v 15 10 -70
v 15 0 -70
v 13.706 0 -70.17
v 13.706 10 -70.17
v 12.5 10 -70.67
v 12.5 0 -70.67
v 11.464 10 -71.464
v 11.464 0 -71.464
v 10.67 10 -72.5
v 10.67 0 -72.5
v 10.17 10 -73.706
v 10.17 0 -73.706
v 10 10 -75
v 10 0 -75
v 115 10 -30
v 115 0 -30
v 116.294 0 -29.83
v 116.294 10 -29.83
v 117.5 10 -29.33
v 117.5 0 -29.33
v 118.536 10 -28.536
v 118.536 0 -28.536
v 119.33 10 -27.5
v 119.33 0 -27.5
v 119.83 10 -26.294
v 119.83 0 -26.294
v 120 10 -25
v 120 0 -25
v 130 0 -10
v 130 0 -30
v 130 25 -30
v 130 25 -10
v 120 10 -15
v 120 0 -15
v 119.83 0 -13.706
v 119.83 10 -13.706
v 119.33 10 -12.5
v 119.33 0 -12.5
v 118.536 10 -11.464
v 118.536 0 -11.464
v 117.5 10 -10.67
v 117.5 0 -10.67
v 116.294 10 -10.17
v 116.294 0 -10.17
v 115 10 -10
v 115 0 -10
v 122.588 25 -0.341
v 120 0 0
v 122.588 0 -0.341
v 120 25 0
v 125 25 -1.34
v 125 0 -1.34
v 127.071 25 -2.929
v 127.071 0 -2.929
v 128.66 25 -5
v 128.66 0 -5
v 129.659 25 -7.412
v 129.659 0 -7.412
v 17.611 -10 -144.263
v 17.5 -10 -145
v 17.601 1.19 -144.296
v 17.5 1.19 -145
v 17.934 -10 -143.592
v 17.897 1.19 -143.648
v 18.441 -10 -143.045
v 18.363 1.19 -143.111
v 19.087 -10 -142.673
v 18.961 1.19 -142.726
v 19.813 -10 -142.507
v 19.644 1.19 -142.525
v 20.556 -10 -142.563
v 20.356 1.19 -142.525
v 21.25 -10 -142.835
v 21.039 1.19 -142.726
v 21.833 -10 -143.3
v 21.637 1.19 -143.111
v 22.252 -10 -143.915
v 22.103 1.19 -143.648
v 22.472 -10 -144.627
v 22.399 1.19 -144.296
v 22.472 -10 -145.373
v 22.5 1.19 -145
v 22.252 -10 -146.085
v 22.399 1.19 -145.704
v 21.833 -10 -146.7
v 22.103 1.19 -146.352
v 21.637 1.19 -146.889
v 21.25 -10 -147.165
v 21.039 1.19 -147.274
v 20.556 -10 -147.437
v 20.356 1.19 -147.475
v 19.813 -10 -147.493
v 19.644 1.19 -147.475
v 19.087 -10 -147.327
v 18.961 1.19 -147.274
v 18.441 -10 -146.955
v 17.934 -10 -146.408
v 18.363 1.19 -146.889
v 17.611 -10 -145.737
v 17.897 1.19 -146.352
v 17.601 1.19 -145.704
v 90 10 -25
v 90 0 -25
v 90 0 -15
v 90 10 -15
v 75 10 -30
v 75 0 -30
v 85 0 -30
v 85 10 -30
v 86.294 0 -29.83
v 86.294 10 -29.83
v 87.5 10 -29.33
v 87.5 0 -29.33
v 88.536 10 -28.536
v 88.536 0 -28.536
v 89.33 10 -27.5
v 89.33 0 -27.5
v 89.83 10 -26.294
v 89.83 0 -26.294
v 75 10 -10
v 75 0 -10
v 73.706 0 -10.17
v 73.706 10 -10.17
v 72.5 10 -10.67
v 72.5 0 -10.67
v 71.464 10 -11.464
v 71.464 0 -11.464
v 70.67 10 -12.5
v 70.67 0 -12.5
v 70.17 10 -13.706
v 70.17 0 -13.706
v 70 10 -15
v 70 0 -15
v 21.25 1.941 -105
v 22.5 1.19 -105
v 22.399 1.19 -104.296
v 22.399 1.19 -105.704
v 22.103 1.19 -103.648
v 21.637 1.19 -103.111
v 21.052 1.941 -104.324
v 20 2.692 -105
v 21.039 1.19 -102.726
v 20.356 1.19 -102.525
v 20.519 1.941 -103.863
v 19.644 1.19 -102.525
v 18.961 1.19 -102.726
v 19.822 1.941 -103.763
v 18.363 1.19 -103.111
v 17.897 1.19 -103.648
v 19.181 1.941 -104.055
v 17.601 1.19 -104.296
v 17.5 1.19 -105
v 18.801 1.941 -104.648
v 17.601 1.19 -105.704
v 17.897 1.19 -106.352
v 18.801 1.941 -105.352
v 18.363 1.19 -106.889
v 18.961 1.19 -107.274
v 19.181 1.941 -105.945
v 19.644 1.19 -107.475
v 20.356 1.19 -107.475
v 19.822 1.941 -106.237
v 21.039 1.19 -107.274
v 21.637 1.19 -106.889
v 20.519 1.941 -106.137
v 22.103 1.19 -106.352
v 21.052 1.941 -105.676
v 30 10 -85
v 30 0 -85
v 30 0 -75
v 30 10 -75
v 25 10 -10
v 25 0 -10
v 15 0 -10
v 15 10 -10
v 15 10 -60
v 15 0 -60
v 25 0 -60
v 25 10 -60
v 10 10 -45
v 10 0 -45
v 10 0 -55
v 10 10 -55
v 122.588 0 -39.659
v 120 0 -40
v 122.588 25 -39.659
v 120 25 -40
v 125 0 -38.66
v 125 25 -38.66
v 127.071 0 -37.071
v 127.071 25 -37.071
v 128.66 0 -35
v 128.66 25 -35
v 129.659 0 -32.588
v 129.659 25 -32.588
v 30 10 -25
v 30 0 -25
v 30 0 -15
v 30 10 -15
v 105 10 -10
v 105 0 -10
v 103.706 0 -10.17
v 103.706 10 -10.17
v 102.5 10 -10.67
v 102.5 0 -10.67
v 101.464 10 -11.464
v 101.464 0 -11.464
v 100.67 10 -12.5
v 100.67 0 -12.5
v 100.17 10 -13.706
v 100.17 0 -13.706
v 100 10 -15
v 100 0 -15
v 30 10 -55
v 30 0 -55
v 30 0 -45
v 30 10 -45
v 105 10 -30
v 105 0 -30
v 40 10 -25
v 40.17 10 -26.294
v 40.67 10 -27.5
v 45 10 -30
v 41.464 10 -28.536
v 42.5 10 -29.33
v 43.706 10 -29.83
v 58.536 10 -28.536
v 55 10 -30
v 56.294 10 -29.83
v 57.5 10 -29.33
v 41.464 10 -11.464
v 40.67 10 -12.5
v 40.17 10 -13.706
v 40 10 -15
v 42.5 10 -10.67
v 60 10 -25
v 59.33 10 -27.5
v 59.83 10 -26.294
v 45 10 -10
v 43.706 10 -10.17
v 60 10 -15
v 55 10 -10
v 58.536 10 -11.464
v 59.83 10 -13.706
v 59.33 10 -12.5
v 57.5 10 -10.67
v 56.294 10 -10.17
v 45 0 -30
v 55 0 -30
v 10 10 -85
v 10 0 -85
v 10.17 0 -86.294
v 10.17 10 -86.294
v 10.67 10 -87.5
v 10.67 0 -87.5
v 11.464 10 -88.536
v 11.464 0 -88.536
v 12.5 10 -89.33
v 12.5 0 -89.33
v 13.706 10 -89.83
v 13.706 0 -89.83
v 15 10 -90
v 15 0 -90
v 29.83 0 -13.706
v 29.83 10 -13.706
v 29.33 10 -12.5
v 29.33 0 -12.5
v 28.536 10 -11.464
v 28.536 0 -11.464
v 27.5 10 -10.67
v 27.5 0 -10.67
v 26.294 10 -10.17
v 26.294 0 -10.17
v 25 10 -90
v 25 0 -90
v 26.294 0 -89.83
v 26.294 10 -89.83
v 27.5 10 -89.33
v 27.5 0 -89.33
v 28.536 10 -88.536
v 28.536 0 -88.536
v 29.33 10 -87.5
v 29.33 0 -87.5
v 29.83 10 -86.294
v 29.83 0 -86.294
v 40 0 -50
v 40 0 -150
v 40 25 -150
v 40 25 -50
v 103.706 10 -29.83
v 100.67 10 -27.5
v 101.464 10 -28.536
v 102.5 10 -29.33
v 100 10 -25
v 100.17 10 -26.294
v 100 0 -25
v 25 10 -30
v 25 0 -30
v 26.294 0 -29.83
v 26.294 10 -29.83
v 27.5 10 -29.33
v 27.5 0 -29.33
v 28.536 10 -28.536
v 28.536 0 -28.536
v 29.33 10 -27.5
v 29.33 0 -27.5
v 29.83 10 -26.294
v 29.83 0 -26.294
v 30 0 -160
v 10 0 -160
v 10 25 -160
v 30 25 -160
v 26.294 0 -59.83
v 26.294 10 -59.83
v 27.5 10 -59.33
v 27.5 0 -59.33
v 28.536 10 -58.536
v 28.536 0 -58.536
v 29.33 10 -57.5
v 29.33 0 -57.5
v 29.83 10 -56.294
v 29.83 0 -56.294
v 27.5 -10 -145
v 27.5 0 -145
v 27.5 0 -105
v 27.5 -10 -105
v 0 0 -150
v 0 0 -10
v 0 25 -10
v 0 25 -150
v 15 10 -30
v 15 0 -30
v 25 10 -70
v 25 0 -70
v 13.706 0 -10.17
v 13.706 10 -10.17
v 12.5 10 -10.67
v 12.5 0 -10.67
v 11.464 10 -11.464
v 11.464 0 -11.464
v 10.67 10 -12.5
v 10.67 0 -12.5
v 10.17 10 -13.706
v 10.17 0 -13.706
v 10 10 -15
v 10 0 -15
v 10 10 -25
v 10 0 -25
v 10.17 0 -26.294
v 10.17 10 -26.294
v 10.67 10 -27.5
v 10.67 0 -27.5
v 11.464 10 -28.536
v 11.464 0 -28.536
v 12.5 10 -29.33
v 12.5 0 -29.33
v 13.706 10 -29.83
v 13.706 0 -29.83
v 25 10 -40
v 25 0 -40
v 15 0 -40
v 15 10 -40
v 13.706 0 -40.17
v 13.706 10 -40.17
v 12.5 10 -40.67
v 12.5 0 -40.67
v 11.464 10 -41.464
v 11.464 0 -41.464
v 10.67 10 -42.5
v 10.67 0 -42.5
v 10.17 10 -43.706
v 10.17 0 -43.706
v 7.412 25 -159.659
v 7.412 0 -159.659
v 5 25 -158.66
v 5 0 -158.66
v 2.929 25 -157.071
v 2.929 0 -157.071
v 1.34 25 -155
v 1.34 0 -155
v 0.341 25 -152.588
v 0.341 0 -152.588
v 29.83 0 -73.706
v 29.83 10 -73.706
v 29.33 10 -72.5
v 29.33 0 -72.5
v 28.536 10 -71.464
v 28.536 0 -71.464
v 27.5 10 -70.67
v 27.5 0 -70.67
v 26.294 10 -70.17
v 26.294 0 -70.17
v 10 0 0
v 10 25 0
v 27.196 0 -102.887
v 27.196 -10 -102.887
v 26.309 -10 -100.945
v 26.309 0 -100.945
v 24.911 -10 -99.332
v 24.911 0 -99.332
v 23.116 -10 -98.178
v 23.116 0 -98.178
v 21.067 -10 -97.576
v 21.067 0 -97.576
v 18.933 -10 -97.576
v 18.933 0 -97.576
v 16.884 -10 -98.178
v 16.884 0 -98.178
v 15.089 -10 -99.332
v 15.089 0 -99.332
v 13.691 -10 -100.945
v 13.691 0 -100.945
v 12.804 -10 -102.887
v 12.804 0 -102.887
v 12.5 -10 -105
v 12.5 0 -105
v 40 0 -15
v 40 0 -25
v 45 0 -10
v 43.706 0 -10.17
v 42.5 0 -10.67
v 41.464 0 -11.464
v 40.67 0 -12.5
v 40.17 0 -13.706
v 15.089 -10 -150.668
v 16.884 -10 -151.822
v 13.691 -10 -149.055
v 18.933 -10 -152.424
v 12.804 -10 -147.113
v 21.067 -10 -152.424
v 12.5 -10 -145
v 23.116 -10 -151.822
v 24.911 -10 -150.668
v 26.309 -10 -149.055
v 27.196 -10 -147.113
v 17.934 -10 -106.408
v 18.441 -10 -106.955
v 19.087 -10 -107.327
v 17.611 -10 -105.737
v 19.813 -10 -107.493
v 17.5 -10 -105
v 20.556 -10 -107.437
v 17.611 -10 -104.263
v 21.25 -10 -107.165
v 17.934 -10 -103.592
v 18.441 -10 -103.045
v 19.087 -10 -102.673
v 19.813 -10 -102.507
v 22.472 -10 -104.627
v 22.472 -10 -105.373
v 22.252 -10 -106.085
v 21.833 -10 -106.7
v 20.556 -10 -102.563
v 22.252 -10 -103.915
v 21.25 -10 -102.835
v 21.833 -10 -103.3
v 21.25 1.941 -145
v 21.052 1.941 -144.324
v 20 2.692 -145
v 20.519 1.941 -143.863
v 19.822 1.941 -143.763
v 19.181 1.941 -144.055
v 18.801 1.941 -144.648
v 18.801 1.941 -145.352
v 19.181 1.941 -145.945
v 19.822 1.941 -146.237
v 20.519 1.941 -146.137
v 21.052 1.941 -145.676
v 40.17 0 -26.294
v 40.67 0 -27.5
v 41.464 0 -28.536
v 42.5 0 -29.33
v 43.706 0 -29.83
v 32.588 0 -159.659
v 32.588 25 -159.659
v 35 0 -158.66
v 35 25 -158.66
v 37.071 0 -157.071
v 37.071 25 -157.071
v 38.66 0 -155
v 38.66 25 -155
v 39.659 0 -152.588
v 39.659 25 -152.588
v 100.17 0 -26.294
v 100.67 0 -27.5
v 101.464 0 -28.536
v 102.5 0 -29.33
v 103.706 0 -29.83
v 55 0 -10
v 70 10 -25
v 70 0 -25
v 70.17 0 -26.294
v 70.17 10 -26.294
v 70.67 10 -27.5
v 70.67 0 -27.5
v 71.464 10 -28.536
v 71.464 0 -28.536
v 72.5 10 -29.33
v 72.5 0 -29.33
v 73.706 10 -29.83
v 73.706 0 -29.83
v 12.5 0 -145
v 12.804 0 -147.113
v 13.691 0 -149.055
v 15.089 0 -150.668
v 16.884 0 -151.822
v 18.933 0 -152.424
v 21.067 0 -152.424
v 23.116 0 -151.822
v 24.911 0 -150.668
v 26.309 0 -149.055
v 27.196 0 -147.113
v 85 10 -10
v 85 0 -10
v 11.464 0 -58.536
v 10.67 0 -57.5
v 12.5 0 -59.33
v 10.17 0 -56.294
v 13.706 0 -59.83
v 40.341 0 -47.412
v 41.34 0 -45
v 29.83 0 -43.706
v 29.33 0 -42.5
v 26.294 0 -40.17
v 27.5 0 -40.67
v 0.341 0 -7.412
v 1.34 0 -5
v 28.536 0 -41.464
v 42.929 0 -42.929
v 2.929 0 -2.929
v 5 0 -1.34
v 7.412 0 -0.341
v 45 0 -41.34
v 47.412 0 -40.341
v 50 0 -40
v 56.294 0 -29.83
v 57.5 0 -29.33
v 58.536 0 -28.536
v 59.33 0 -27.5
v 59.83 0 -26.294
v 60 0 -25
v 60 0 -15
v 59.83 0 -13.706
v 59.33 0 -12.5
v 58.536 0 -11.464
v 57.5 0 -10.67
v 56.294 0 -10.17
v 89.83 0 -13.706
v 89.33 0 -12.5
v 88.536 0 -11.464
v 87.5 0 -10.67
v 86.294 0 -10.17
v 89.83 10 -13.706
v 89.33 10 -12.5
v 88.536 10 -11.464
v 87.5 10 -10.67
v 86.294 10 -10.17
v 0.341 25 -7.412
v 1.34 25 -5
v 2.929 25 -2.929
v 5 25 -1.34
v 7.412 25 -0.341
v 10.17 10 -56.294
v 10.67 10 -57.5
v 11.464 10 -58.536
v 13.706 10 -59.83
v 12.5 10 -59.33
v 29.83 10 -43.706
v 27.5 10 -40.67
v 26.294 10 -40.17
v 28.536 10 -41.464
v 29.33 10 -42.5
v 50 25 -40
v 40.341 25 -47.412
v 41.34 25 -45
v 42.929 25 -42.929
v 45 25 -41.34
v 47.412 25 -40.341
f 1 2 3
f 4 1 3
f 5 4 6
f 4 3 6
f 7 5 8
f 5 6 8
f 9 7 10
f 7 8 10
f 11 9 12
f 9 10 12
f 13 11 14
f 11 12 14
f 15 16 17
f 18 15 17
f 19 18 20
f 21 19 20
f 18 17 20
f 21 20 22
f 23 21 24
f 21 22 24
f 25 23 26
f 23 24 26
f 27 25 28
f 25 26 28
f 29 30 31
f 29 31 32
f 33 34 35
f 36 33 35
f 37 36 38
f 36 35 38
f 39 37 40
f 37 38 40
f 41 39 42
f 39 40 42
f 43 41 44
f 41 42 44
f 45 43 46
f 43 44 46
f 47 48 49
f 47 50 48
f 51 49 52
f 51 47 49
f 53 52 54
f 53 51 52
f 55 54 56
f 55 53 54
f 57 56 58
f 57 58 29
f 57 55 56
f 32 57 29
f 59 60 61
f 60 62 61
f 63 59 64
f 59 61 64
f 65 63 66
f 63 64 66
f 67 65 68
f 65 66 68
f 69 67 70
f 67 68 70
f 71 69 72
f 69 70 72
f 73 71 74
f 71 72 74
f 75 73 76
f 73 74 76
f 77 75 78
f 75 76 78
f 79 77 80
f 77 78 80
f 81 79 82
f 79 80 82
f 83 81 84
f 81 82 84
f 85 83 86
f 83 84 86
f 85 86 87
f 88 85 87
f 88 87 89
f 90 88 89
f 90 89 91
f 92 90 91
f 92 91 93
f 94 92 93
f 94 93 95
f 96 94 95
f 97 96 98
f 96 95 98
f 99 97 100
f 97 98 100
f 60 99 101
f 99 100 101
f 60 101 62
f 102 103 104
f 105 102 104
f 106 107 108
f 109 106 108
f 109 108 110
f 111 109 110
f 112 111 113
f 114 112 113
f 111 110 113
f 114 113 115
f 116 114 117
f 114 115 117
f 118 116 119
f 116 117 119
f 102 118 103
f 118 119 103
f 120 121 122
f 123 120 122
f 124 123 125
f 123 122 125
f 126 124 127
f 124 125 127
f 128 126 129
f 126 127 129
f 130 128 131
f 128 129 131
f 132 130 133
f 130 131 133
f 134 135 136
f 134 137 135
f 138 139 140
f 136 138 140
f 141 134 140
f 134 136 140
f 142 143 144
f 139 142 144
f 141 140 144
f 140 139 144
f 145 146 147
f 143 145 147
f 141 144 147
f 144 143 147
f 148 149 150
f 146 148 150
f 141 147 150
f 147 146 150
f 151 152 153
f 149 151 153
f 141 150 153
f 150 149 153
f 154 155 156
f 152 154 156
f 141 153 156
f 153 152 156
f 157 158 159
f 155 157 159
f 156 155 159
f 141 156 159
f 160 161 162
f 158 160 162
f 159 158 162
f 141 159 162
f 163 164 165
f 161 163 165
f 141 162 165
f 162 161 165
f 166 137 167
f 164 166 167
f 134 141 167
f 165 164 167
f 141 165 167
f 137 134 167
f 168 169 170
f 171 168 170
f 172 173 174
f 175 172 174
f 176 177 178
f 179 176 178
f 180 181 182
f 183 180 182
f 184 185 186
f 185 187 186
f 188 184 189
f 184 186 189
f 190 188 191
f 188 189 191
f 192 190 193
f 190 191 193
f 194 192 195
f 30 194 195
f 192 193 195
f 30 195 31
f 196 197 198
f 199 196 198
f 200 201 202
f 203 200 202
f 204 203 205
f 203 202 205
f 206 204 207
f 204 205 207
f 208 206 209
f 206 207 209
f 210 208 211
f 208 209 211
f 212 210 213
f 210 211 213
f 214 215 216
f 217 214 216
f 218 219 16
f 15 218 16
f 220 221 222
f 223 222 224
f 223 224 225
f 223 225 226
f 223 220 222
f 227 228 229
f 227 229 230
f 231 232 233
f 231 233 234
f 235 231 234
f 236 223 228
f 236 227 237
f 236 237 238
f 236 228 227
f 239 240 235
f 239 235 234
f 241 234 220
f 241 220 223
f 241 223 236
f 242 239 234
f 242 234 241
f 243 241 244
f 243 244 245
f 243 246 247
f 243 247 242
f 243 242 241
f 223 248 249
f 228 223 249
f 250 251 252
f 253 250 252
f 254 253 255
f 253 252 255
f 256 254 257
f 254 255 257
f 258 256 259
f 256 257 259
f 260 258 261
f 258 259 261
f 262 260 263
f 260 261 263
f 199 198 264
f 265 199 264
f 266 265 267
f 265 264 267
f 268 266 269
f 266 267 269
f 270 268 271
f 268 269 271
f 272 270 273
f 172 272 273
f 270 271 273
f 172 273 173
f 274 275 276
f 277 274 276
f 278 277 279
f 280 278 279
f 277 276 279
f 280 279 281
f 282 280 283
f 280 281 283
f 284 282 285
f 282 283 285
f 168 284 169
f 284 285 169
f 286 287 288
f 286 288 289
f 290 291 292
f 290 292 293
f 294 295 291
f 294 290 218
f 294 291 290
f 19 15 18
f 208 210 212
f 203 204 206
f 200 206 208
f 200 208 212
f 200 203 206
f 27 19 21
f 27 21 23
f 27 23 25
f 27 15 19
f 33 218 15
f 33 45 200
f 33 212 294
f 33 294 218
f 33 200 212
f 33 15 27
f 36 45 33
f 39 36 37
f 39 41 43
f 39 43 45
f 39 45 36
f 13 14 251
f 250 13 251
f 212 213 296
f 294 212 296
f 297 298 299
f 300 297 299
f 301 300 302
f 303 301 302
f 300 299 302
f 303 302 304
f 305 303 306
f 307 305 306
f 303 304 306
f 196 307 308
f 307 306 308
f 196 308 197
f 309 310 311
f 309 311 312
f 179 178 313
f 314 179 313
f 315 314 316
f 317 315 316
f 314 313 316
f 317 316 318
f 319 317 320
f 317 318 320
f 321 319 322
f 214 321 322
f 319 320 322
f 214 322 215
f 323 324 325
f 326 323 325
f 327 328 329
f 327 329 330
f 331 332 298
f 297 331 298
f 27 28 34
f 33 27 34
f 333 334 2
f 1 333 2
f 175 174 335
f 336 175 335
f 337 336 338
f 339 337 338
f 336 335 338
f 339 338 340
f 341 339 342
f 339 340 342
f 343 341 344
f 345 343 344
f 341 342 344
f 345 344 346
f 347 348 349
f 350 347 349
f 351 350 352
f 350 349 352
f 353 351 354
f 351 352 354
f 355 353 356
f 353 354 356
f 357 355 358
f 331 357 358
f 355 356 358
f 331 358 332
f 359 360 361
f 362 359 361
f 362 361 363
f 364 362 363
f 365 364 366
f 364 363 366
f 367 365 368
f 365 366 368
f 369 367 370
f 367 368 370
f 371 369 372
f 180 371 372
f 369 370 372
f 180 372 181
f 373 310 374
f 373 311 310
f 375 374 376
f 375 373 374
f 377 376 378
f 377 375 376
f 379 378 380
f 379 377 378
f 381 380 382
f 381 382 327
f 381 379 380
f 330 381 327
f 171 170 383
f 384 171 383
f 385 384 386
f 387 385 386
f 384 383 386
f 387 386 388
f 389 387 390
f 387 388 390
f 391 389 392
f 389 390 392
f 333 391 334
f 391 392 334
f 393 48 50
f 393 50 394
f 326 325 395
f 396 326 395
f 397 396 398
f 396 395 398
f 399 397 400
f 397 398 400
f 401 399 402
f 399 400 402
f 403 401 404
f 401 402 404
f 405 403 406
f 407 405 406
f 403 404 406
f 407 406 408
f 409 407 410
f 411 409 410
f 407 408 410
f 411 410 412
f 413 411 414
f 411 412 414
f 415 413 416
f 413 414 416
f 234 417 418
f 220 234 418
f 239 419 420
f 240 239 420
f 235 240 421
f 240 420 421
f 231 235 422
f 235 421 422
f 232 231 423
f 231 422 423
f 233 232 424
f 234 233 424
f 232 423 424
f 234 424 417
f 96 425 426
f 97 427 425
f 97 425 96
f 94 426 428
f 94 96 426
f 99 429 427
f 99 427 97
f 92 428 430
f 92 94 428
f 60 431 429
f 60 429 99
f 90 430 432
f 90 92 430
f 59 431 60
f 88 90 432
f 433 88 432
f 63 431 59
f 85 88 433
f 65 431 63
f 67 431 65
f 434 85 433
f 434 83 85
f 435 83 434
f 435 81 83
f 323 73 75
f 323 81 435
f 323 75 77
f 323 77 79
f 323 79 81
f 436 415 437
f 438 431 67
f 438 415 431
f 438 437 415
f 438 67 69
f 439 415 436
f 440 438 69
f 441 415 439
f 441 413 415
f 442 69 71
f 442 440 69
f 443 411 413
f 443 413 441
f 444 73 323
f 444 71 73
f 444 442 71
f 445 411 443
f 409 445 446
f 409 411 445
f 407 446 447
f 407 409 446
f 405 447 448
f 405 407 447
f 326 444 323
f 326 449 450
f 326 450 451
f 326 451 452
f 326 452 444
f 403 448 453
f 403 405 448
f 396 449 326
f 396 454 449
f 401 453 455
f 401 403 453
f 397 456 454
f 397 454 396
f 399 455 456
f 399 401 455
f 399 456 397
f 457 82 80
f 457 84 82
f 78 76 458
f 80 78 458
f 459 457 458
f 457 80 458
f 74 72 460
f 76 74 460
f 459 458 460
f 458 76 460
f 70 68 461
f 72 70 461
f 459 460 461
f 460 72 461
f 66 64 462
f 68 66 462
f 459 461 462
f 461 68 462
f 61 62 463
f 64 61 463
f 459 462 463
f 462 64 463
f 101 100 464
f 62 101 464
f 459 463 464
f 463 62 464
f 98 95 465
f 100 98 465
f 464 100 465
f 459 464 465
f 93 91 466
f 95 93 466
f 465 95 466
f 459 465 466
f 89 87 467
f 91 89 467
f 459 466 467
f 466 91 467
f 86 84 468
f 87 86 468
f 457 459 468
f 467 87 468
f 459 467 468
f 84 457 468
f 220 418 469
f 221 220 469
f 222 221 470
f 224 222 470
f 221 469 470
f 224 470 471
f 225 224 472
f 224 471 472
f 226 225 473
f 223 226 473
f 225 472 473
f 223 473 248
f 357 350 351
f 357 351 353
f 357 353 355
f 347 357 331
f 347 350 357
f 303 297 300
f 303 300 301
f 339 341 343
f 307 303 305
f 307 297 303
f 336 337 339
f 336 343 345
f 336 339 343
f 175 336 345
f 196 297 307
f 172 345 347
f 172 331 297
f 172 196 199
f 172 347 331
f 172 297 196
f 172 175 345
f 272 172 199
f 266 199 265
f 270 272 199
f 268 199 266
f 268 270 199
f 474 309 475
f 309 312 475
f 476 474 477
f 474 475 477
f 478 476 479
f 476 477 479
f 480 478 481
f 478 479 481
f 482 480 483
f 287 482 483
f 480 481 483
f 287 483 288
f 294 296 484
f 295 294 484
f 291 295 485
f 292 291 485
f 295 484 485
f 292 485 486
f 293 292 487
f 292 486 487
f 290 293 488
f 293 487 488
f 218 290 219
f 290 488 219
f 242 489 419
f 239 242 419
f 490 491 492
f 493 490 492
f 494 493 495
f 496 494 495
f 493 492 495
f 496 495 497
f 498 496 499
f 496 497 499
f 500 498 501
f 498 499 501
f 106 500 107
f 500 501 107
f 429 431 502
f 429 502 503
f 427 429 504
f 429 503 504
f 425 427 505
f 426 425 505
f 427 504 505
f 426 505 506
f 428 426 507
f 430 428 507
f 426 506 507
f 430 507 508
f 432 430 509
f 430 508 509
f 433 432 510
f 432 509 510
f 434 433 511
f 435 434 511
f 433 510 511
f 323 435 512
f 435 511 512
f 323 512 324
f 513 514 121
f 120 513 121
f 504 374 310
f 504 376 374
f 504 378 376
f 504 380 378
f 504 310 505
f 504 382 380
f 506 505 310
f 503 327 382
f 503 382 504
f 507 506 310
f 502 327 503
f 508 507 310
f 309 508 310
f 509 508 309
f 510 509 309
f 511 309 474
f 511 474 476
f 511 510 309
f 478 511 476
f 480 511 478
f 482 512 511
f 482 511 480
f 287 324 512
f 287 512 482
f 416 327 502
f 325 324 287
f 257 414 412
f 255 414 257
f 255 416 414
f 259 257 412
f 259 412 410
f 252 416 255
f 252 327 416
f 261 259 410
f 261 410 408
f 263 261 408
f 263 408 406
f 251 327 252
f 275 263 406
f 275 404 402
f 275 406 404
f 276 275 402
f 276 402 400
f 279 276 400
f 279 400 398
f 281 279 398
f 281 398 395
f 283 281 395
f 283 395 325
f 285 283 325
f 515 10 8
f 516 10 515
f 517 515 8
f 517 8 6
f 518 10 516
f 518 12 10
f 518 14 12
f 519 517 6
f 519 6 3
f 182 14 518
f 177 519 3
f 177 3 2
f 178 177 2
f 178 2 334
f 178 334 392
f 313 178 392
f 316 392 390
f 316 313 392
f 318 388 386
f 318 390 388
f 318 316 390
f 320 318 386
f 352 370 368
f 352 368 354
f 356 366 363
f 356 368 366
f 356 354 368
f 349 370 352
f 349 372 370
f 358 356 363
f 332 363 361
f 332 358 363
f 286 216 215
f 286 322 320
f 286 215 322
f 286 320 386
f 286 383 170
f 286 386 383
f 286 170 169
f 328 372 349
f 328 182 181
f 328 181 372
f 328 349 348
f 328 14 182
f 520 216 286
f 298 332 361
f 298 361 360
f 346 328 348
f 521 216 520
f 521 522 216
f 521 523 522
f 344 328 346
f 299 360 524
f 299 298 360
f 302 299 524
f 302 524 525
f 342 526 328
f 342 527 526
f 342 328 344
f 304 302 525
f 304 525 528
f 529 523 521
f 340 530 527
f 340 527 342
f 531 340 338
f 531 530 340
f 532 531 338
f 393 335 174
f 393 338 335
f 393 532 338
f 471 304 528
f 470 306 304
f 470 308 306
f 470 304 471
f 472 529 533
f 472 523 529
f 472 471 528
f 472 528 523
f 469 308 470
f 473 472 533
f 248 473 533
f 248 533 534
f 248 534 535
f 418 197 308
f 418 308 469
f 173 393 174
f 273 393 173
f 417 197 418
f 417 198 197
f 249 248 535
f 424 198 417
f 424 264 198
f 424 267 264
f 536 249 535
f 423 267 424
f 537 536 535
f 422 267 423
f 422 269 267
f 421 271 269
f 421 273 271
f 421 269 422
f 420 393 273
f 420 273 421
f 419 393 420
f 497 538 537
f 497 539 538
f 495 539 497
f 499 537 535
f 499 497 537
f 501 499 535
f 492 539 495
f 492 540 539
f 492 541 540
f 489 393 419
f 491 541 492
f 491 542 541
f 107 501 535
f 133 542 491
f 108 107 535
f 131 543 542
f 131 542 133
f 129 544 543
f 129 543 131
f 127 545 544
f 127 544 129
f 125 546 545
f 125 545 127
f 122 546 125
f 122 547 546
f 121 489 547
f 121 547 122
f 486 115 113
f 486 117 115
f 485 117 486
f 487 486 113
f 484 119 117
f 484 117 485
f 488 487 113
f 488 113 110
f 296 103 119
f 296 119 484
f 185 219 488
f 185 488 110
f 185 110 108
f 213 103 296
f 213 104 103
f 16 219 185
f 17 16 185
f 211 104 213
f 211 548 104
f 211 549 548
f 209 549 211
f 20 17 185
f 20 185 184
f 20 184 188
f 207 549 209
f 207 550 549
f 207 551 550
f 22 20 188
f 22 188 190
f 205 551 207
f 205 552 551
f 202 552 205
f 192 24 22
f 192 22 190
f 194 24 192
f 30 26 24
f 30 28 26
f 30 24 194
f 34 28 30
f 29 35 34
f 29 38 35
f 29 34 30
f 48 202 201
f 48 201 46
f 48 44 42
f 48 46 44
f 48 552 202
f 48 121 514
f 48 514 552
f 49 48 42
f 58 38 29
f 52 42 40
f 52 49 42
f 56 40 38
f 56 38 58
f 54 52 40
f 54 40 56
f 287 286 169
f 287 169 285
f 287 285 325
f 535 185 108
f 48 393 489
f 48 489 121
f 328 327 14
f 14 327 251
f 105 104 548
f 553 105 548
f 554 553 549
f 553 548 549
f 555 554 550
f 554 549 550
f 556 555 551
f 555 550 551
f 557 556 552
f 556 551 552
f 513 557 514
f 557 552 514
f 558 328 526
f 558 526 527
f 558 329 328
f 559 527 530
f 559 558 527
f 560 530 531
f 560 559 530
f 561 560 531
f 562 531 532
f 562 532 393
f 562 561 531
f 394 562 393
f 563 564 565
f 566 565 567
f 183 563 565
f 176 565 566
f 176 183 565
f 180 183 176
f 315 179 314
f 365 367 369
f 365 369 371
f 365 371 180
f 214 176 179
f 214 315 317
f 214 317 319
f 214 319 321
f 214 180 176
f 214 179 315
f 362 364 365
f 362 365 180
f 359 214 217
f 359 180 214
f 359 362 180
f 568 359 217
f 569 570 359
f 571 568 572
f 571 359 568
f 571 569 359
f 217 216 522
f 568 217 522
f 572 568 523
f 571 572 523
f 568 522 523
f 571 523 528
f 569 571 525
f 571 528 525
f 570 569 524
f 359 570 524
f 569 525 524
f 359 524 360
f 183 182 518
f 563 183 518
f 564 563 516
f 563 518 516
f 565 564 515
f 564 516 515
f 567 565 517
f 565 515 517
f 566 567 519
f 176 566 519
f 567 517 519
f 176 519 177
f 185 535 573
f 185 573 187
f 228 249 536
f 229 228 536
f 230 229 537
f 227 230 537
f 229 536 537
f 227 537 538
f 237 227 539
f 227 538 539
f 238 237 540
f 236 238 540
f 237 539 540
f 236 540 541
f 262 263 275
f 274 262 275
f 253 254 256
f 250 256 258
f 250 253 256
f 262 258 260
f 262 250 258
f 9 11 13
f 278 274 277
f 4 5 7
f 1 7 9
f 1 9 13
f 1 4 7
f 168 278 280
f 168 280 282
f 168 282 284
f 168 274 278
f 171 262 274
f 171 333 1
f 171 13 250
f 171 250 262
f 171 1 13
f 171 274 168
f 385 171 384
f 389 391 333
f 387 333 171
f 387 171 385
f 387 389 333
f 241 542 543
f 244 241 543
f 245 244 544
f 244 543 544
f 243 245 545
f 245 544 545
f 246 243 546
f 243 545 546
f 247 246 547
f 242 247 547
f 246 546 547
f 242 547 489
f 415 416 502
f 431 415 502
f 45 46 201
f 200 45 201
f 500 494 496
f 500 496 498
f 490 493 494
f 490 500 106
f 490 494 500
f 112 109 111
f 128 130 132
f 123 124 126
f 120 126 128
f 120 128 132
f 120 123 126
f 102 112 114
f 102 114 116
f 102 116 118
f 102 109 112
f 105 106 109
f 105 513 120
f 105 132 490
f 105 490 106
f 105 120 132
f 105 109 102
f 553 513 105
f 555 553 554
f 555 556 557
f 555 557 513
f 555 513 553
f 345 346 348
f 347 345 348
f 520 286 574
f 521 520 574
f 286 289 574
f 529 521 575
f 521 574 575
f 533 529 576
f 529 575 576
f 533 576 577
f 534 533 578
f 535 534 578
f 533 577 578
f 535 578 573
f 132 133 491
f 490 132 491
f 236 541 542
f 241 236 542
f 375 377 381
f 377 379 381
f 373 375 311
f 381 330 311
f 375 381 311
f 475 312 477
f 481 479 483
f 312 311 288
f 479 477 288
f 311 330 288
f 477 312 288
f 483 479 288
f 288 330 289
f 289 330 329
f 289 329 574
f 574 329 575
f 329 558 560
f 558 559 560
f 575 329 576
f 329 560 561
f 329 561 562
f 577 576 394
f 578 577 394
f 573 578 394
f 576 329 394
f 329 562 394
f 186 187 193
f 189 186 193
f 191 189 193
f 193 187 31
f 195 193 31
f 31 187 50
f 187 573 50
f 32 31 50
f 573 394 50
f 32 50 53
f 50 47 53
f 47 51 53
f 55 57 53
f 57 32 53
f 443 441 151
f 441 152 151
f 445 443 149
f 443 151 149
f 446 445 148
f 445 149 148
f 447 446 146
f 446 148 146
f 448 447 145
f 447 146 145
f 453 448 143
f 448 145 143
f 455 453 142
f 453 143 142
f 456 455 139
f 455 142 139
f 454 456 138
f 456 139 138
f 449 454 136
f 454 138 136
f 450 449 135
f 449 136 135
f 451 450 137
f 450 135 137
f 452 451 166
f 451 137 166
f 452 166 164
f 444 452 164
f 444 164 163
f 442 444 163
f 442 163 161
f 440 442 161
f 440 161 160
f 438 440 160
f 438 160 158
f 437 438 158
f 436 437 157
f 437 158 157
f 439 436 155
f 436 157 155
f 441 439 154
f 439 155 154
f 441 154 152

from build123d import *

# Parameters (mm, degrees)
F0_W     = 10
F0_H     = 10
F1_DEPTH = 25
F2_DEPTH = 10
F3_R     = 10
F5_DEPTH = 10
F7_D     = 5
F7_DEPTH = 11.19
F7_TIP   = 1.5021515476


with BuildPart() as f1:
    # F0 (on Front) → F1 (new body)
    with BuildSketch(Plane.XZ):
        with BuildLine():
            Line((15, -40), (0, -40))
            Line((0, -40), (0, -160))
            Line((0, -160), (40, -160))
            Line((40, -160), (40, -85))
            Line((40, -85), (40, -75))
            Line((40, -75), (40, -55))
            Line((40, -55), (40, -45))
            Line((40, -45), (40, -40))
            Line((40, -40), (25, -40))
            ThreePointArc((25, -40), (28.5355339059, -41.4644660941), (30, -45))
            Line((30, -45), (30, -55))
            ThreePointArc((30, -55), (28.5355339059, -58.5355339059), (25, -60))
            Line((25, -60), (15, -60))
            ThreePointArc((15, -60), (11.4644660941, -58.5355339059), (10, -55))
            Line((10, -55), (10, -45))
            ThreePointArc((10, -45), (11.4644660941, -41.4644660941), (15, -40))
        make_face()
        with BuildLine():
            Line((25, -90), (15, -90))
            ThreePointArc((15, -90), (11.4644660941, -88.5355339059), (10, -85))
            Line((10, -85), (10, -75))
            ThreePointArc((10, -75), (11.4644660941, -71.4644660941), (15, -70))
            Line((15, -70), (25, -70))
            ThreePointArc((25, -70), (28.5355339059, -71.4644660941), (30, -75))
            Line((30, -75), (30, -85))
            ThreePointArc((30, -85), (28.5355339059, -88.5355339059), (25, -90))
        make_face(mode=Mode.SUBTRACT)
        Polygon((40, 0), (10, 0), (10, -10), (0, -10), (0, -40), (15, -40), (25, -40), (40, -40), (40, -25), (40, -15), align=None)
        with BuildLine():
            ThreePointArc((10, -15), (11.4644660941, -11.4644660941), (15, -10))
            Line((15, -10), (25, -10))
            ThreePointArc((25, -10), (28.5355339059, -11.4644660941), (30, -15))
            Line((30, -15), (30, -25))
            ThreePointArc((30, -25), (28.5355339059, -28.5355339059), (25, -30))
            Line((25, -30), (15, -30))
            ThreePointArc((15, -30), (11.4644660941, -28.5355339059), (10, -25))
            Line((10, -25), (10, -15))
        make_face(mode=Mode.SUBTRACT)
        with Locations((5, -5)):
            Rectangle(F0_W, F0_H)
        with BuildLine():
            Line((130, 0), (40, 0))
            Line((40, 0), (40, -15))
            ThreePointArc((40, -15), (41.4644660941, -11.4644660941), (45, -10))
            Line((45, -10), (55, -10))
            ThreePointArc((55, -10), (58.5355339059, -11.4644660941), (60, -15))
            Line((60, -15), (60, -25))
            ThreePointArc((60, -25), (58.5355339059, -28.5355339059), (55, -30))
            Line((55, -30), (45, -30))
            ThreePointArc((45, -30), (41.4644660941, -28.5355339059), (40, -25))
            Line((40, -25), (40, -40))
            Line((40, -40), (45, -40))
            Line((45, -40), (55, -40))
            Line((55, -40), (75, -40))
            Line((75, -40), (85, -40))
            Line((85, -40), (105, -40))
            Line((105, -40), (115, -40))
            Line((115, -40), (130, -40))
            Line((130, -40), (130, 0))
        make_face()
        with BuildLine():
            Line((85, -30), (75, -30))
            ThreePointArc((75, -30), (71.4644660941, -28.5355339059), (70, -25))
            Line((70, -25), (70, -15))
            ThreePointArc((70, -15), (71.4644660941, -11.4644660941), (75, -10))
            Line((75, -10), (85, -10))
            ThreePointArc((85, -10), (88.5355339059, -11.4644660941), (90, -15))
            Line((90, -15), (90, -25))
            ThreePointArc((90, -25), (88.5355339059, -28.5355339059), (85, -30))
        make_face(mode=Mode.SUBTRACT)
        with BuildLine():
            Line((115, -30), (105, -30))
            ThreePointArc((105, -30), (101.4644660941, -28.5355339059), (100, -25))
            Line((100, -25), (100, -15))
            ThreePointArc((100, -15), (101.4644660941, -11.4644660941), (105, -10))
            Line((105, -10), (115, -10))
            ThreePointArc((115, -10), (118.5355339059, -11.4644660941), (120, -15))
            Line((120, -15), (120, -25))
            ThreePointArc((120, -25), (118.5355339059, -28.5355339059), (115, -30))
        make_face(mode=Mode.SUBTRACT)
        with BuildLine():
            ThreePointArc((10, -85), (11.4644660941, -88.5355339059), (15, -90))
            Line((15, -90), (25, -90))
            ThreePointArc((25, -90), (28.5355339059, -88.5355339059), (30, -85))
            Line((30, -85), (30, -75))
            ThreePointArc((30, -75), (28.5355339059, -71.4644660941), (25, -70))
            Line((25, -70), (15, -70))
            ThreePointArc((15, -70), (11.4644660941, -71.4644660941), (10, -75))
            Line((10, -75), (10, -85))
        make_face()
        with BuildLine():
            Line((25, -40), (15, -40))
            ThreePointArc((15, -40), (11.4644660941, -41.4644660941), (10, -45))
            Line((10, -45), (10, -55))
            ThreePointArc((10, -55), (11.4644660941, -58.5355339059), (15, -60))
            Line((15, -60), (25, -60))
            ThreePointArc((25, -60), (28.5355339059, -58.5355339059), (30, -55))
            Line((30, -55), (30, -45))
            ThreePointArc((30, -45), (28.5355339059, -41.4644660941), (25, -40))
        make_face()
        with BuildLine():
            Line((25, -10), (15, -10))
            ThreePointArc((15, -10), (11.4644660941, -11.4644660941), (10, -15))
            Line((10, -15), (10, -25))
            ThreePointArc((10, -25), (11.4644660941, -28.5355339059), (15, -30))
            Line((15, -30), (25, -30))
            ThreePointArc((25, -30), (28.5355339059, -28.5355339059), (30, -25))
            Line((30, -25), (30, -15))
            ThreePointArc((30, -15), (28.5355339059, -11.4644660941), (25, -10))
        make_face()
        with BuildLine():
            ThreePointArc((45, -10), (41.4644660941, -11.4644660941), (40, -15))
            Line((40, -15), (40, -25))
            ThreePointArc((40, -25), (41.4644660941, -28.5355339059), (45, -30))
            Line((45, -30), (55, -30))
            ThreePointArc((55, -30), (58.5355339059, -28.5355339059), (60, -25))
            Line((60, -25), (60, -15))
            ThreePointArc((60, -15), (58.5355339059, -11.4644660941), (55, -10))
            Line((55, -10), (45, -10))
        make_face()
        with BuildLine():
            ThreePointArc((70, -25), (71.4644660941, -28.5355339059), (75, -30))
            Line((75, -30), (85, -30))
            ThreePointArc((85, -30), (88.5355339059, -28.5355339059), (90, -25))
            Line((90, -25), (90, -15))
            ThreePointArc((90, -15), (88.5355339059, -11.4644660941), (85, -10))
            Line((85, -10), (75, -10))
            ThreePointArc((75, -10), (71.4644660941, -11.4644660941), (70, -15))
            Line((70, -15), (70, -25))
        make_face()
        with BuildLine():
            ThreePointArc((100, -25), (101.4644660941, -28.5355339059), (105, -30))
            Line((105, -30), (115, -30))
            ThreePointArc((115, -30), (118.5355339059, -28.5355339059), (120, -25))
            Line((120, -25), (120, -15))
            ThreePointArc((120, -15), (118.5355339059, -11.4644660941), (115, -10))
            Line((115, -10), (105, -10))
            ThreePointArc((105, -10), (101.4644660941, -11.4644660941), (100, -15))
            Line((100, -15), (100, -25))
        make_face()
    extrude(amount=-F1_DEPTH)

    # F0 (on Front) → F2 (cut)
    with BuildSketch(Plane.XZ):
        with BuildLine():
            Line((25, -10), (15, -10))
            ThreePointArc((15, -10), (11.4644660941, -11.4644660941), (10, -15))
            Line((10, -15), (10, -25))
            ThreePointArc((10, -25), (11.4644660941, -28.5355339059), (15, -30))
            Line((15, -30), (25, -30))
            ThreePointArc((25, -30), (28.5355339059, -28.5355339059), (30, -25))
            Line((30, -25), (30, -15))
            ThreePointArc((30, -15), (28.5355339059, -11.4644660941), (25, -10))
        make_face()
        with BuildLine():
            ThreePointArc((45, -10), (41.4644660941, -11.4644660941), (40, -15))
            Line((40, -15), (40, -25))
            ThreePointArc((40, -25), (41.4644660941, -28.5355339059), (45, -30))
            Line((45, -30), (55, -30))
            ThreePointArc((55, -30), (58.5355339059, -28.5355339059), (60, -25))
            Line((60, -25), (60, -15))
            ThreePointArc((60, -15), (58.5355339059, -11.4644660941), (55, -10))
            Line((55, -10), (45, -10))
        make_face()
        with BuildLine():
            ThreePointArc((70, -25), (71.4644660941, -28.5355339059), (75, -30))
            Line((75, -30), (85, -30))
            ThreePointArc((85, -30), (88.5355339059, -28.5355339059), (90, -25))
            Line((90, -25), (90, -15))
            ThreePointArc((90, -15), (88.5355339059, -11.4644660941), (85, -10))
            Line((85, -10), (75, -10))
            ThreePointArc((75, -10), (71.4644660941, -11.4644660941), (70, -15))
            Line((70, -15), (70, -25))
        make_face()
        with BuildLine():
            ThreePointArc((100, -25), (101.4644660941, -28.5355339059), (105, -30))
            Line((105, -30), (115, -30))
            ThreePointArc((115, -30), (118.5355339059, -28.5355339059), (120, -25))
            Line((120, -25), (120, -15))
            ThreePointArc((120, -15), (118.5355339059, -11.4644660941), (115, -10))
            Line((115, -10), (105, -10))
            ThreePointArc((105, -10), (101.4644660941, -11.4644660941), (100, -15))
            Line((100, -15), (100, -25))
        make_face()
        with BuildLine():
            Line((25, -40), (15, -40))
            ThreePointArc((15, -40), (11.4644660941, -41.4644660941), (10, -45))
            Line((10, -45), (10, -55))
            ThreePointArc((10, -55), (11.4644660941, -58.5355339059), (15, -60))
            Line((15, -60), (25, -60))
            ThreePointArc((25, -60), (28.5355339059, -58.5355339059), (30, -55))
            Line((30, -55), (30, -45))
            ThreePointArc((30, -45), (28.5355339059, -41.4644660941), (25, -40))
        make_face()
        with BuildLine():
            ThreePointArc((10, -85), (11.4644660941, -88.5355339059), (15, -90))
            Line((15, -90), (25, -90))
            ThreePointArc((25, -90), (28.5355339059, -88.5355339059), (30, -85))
            Line((30, -85), (30, -75))
            ThreePointArc((30, -75), (28.5355339059, -71.4644660941), (25, -70))
            Line((25, -70), (15, -70))
            ThreePointArc((15, -70), (11.4644660941, -71.4644660941), (10, -75))
            Line((10, -75), (10, -85))
        make_face()
    extrude(amount=-F2_DEPTH, mode=Mode.SUBTRACT)

    # F3
    f3_edges = [f1.edges().sort_by_distance(p)[0] for p in [
        (0, 12.5, -160),
        (40, 12.5, -160),
        (40, 12.5, -40),
        (130, 12.5, -40),
        (130, 12.5, 0),
        (0, 12.5, 0),
    ]]
    fillet(f3_edges, radius=F3_R)

    # F4 (on face) → F5 (join)
    with BuildSketch(Plane.XZ):
        with BuildLine():
            ThreePointArc((12.5, -145), (14.6966991411, -150.3033008589), (20, -152.5))
            ThreePointArc((20, -152.5), (25.3033008589, -150.3033008589), (27.5, -145))
            Line((27.5, -145), (27.5, -105))
            ThreePointArc((27.5, -105), (20, -97.5), (12.5, -105))
            Line((12.5, -105), (12.5, -145))
        make_face()
    extrude(amount=F5_DEPTH)

    # F7
    with Locations(Plane.XZ.offset(10)):
        with Locations((20, -105), (20, -145)):
            Hole(F7_D / 2, depth=F7_DEPTH)
            with Locations((0, 0, -(F7_DEPTH + F7_TIP / 2))):  # 118° drill point
                Cone(0, F7_D / 2, F7_TIP, mode=Mode.SUBTRACT)


solid = f1.part
